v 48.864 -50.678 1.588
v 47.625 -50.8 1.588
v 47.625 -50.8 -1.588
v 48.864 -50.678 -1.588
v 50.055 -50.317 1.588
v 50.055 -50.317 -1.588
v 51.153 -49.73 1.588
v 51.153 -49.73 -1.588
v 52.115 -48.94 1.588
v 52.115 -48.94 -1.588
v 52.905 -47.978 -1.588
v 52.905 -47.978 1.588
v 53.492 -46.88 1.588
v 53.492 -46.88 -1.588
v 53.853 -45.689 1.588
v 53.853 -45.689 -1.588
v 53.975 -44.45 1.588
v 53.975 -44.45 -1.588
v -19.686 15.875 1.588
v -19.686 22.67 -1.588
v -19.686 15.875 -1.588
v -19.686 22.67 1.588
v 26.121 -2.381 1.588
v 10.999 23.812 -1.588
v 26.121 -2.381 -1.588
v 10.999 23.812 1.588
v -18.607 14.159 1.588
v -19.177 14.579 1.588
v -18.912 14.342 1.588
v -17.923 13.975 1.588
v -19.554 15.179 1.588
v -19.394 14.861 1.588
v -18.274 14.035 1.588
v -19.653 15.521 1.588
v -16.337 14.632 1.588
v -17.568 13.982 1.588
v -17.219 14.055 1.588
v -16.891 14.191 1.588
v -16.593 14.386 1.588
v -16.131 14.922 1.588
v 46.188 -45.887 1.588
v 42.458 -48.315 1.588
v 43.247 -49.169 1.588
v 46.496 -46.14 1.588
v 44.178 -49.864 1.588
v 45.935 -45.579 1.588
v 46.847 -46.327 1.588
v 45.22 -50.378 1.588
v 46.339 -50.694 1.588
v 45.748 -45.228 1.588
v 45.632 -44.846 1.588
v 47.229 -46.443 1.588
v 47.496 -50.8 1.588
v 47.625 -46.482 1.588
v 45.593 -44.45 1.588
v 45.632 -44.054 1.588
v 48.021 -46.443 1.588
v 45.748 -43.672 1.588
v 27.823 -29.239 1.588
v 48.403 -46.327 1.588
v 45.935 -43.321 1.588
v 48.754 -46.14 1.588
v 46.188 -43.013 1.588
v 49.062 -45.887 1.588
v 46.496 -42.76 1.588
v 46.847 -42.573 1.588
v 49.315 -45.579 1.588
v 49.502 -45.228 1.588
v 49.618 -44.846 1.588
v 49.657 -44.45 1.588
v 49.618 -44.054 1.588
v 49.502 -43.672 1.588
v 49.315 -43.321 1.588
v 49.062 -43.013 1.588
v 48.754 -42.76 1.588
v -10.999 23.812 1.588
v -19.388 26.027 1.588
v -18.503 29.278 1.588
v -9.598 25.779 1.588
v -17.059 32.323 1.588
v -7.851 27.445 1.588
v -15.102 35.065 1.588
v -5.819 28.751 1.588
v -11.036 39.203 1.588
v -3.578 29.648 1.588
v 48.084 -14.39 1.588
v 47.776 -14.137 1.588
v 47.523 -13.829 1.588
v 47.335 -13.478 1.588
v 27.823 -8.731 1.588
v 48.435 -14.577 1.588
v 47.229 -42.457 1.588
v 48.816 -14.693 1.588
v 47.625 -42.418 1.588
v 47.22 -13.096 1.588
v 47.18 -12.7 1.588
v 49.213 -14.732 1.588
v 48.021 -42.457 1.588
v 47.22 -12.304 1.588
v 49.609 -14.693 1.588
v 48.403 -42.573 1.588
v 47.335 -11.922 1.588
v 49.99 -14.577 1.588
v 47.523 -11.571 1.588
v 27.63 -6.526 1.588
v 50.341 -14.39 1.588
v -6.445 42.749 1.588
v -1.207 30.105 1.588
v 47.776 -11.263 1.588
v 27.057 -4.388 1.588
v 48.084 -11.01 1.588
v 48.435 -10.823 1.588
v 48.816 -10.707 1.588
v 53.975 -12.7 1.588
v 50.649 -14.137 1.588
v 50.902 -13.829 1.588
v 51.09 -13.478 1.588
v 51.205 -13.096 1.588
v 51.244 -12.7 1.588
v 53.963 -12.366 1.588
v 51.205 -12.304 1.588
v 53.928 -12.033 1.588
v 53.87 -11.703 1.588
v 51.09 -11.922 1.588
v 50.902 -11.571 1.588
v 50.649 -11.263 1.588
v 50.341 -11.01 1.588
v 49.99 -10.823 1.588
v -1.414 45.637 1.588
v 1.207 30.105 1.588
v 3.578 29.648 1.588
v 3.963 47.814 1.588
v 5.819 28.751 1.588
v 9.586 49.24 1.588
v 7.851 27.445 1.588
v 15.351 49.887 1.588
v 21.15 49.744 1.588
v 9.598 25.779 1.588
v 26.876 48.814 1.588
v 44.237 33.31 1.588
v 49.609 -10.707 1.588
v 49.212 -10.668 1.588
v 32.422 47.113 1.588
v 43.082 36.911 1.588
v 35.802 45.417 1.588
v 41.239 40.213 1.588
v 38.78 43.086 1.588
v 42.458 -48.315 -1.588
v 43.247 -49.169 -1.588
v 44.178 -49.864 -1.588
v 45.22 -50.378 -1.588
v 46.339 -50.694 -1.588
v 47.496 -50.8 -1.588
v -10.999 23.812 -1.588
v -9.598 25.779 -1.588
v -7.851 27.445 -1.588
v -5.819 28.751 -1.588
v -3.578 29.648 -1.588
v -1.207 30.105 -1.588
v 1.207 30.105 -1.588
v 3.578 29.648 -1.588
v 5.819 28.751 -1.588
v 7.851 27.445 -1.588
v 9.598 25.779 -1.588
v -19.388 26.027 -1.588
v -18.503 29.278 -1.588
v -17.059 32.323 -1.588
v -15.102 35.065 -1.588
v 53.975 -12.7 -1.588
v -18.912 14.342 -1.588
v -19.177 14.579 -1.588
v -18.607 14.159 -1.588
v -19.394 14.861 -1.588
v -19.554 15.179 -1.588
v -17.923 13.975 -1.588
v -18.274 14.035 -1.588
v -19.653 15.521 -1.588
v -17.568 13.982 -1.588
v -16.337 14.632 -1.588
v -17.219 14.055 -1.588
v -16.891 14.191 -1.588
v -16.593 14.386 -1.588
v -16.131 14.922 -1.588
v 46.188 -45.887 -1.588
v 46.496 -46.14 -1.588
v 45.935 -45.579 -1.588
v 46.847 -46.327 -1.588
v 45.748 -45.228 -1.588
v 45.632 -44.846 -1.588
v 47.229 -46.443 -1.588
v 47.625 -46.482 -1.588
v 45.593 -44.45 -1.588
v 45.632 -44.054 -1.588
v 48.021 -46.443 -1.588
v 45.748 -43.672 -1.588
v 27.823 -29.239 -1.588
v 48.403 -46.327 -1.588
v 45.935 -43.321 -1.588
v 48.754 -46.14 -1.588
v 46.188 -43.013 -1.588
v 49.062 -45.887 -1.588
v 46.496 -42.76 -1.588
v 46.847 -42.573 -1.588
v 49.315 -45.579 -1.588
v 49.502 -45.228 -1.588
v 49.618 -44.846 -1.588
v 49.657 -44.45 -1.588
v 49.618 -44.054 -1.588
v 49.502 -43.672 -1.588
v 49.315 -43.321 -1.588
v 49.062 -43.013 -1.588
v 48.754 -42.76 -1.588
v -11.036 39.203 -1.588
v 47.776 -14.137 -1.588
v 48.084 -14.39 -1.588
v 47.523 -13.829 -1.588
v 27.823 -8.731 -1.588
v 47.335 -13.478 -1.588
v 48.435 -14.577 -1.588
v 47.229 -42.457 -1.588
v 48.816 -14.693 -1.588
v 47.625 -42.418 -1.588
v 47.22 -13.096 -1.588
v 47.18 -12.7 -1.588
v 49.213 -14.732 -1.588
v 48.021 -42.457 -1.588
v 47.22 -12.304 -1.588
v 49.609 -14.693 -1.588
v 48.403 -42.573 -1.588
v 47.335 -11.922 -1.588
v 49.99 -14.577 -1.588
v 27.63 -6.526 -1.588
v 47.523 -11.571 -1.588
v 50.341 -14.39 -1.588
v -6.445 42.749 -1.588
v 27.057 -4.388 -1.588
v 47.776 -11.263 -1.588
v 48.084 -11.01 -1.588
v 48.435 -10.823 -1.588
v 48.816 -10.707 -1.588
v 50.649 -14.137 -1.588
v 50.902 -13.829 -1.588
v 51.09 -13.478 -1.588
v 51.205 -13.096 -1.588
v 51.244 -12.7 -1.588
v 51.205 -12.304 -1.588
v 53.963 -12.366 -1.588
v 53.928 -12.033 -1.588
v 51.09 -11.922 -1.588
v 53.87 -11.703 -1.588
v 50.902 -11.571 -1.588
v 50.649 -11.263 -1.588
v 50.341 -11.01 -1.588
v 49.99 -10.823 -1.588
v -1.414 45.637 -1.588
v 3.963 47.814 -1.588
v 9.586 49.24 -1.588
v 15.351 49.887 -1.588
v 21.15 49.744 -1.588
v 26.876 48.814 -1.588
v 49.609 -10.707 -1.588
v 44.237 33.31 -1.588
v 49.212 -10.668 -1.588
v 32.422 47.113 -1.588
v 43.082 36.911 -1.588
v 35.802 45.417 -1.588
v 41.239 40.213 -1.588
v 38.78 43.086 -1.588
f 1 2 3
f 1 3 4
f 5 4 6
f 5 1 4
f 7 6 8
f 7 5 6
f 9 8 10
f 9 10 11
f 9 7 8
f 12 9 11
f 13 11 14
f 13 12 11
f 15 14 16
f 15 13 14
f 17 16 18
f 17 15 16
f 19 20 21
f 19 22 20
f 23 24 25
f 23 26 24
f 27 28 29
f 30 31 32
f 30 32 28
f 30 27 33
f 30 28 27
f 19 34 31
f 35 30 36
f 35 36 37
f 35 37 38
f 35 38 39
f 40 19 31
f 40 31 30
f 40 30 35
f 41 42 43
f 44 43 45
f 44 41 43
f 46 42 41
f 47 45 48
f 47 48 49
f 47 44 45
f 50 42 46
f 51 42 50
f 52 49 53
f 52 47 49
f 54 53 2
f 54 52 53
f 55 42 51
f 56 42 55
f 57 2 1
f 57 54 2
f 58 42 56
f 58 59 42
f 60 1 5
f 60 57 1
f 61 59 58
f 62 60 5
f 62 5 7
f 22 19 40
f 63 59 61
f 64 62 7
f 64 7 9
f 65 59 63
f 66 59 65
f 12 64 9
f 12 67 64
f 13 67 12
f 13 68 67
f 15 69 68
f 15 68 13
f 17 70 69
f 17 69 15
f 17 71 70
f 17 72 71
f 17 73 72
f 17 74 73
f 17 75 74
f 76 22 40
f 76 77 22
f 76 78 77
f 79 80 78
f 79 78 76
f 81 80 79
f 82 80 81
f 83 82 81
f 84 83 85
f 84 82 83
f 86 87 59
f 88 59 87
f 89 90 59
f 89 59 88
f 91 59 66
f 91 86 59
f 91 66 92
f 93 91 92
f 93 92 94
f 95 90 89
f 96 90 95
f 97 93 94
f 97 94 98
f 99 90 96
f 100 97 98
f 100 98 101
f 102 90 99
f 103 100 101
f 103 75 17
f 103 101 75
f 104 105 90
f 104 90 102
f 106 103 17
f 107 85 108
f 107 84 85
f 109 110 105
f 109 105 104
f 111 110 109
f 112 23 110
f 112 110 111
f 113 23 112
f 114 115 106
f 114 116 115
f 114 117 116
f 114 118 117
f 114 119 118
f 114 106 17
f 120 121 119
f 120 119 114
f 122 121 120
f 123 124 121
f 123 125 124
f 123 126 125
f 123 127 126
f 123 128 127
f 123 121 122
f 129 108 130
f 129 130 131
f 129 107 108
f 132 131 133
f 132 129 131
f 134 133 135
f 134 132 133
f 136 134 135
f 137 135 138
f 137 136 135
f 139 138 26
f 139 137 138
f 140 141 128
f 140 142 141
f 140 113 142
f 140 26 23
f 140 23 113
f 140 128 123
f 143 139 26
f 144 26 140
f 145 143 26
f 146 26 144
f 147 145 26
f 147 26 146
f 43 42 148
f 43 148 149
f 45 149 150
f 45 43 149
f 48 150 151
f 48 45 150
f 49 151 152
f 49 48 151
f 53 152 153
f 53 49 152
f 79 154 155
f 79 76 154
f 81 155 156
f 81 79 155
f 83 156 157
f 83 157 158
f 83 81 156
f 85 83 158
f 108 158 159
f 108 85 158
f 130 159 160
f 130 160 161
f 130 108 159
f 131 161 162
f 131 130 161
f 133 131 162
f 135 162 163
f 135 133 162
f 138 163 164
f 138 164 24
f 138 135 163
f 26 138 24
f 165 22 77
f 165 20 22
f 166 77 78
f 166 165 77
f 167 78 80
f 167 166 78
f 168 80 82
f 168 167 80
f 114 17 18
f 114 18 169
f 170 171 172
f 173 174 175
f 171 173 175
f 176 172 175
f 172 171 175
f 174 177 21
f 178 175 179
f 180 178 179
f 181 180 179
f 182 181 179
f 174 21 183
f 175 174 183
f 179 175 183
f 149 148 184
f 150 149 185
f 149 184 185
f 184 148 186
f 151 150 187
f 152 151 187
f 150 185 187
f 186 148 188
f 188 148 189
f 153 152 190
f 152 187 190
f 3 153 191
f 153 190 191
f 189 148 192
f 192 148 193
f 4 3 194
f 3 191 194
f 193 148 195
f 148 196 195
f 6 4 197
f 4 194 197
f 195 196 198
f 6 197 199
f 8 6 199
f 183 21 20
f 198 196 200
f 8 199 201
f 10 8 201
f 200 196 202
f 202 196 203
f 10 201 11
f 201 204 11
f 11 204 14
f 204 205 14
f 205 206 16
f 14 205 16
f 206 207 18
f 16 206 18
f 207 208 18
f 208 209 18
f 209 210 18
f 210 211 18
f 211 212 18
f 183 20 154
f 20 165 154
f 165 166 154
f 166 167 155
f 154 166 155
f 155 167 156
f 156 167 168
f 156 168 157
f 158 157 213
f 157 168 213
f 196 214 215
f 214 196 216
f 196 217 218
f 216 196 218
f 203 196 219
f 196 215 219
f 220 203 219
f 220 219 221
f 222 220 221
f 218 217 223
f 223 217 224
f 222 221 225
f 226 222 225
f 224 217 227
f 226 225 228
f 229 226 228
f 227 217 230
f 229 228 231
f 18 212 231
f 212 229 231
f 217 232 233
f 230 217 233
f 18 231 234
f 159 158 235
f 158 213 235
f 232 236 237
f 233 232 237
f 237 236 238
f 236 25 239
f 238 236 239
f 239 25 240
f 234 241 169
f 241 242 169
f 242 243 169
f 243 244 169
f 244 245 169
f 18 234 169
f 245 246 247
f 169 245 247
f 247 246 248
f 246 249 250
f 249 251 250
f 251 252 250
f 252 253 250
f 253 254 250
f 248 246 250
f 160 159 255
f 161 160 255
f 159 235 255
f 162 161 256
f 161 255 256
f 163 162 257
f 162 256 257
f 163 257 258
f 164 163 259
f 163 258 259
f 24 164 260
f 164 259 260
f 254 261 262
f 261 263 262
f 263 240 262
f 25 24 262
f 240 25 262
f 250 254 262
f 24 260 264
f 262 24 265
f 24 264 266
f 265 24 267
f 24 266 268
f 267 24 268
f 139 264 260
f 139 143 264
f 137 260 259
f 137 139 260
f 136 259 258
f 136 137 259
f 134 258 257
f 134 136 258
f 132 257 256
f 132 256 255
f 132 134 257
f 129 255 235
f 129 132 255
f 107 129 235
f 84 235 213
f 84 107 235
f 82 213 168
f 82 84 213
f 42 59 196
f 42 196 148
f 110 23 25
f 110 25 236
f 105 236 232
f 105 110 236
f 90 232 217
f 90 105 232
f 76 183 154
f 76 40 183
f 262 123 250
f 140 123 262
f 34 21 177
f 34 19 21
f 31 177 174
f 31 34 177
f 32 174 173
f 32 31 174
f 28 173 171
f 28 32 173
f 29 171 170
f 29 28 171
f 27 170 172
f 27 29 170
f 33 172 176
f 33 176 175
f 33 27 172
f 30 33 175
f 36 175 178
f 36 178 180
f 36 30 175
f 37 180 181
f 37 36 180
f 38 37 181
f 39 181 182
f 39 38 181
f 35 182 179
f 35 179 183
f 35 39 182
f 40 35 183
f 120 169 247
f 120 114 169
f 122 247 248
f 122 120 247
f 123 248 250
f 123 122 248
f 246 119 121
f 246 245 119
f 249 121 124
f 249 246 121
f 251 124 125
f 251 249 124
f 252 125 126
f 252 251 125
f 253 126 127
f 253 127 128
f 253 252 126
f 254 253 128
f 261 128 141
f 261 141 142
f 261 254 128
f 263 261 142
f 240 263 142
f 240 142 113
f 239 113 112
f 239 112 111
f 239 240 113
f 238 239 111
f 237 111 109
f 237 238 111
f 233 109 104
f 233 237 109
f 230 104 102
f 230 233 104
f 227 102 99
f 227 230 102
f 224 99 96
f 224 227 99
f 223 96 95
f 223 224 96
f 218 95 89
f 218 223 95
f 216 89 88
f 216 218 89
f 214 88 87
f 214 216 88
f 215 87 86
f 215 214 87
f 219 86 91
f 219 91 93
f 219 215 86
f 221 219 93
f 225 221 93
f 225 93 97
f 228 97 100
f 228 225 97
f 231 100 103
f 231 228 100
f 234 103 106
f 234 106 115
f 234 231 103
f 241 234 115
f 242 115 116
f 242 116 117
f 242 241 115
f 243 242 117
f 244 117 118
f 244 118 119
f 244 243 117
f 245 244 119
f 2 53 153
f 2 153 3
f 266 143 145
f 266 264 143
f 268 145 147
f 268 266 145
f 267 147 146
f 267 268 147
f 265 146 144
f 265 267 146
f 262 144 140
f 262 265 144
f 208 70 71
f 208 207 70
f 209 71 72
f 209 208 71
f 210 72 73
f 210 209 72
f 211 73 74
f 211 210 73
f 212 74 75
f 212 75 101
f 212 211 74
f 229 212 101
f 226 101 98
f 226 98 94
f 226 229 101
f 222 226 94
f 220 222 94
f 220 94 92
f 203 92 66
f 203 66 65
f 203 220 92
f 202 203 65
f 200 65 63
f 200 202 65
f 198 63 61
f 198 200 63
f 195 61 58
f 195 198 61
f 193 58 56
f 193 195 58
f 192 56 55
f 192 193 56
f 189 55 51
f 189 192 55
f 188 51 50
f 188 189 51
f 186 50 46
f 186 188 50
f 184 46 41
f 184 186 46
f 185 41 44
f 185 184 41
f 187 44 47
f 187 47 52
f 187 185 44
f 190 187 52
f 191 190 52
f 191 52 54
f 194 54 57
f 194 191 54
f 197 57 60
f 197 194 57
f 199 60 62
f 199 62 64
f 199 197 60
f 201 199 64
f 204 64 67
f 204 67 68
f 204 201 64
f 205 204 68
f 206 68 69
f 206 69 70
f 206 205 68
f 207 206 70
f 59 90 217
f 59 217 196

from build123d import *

# Parameters (mm, degrees)
SKETCH1_R           = 2.032
BOSS_EXTRUDE1_DEPTH = 1.5875
FILLET1_R           = 19.05


with BuildPart() as part:
    # Sketch1 → Boss-Extrude1 (new, symmetric)
    with BuildSketch(Plane.XY):
        with BuildLine():
            Line((10.998522628, 23.8125), (26.121491242, -2.38125))
            ThreePointArc((26.121491242, -2.38125), (27.390226607, -5.444248127), (27.822968614, -8.73125))
            Line((27.822968614, -8.73125), (27.822968614, -29.239270948))
            Line((27.822968614, -29.239270948), (42.458005799, -48.315226419))
            ThreePointArc((42.458005799, -48.315226419), (44.687348893, -50.145027996), (47.496113055, -50.8))
            Line((47.496113055, -50.8), (47.625, -50.8))
            ThreePointArc((47.625, -50.8), (52.115128061, -48.940128061), (53.975, -44.45))
            Line((53.975, -44.45), (53.975, -12.7))
            ThreePointArc((53.975, -12.7), (53.948566881, -12.198924408), (53.869560945, -11.703411017))
            Line((53.869560945, -11.703411017), (42.458005799, 41.622793369))
            ThreePointArc((42.458005799, 41.622793369), (8.463163904, 49.01990761), (-19.685944915, 28.575))
            Line((-19.685944915, 28.575), (-19.685944915, 15.875))
            ThreePointArc((-19.685944915, 15.875), (-18.273995196, 14.034911301), (-16.131166521, 14.9225))
            Line((-16.131166521, 14.9225), (-10.998522628, 23.8125))
            ThreePointArc((-10.998522628, 23.8125), (0, 30.1625), (10.998522628, 23.8125))
        make_face()
        with Locations((47.625, -44.45)):
            Circle(SKETCH1_R, mode=Mode.SUBTRACT)
        with Locations((49.2125, -12.7)):
            Circle(SKETCH1_R, mode=Mode.SUBTRACT)
    extrude(amount=BOSS_EXTRUDE1_DEPTH, both=True)

    # Fillet1
    fillet1_edges = [part.edges().sort_by_distance(p)[0] for p in [
        (-19.685944915, 28.575, 0),
        (42.458005799, 41.622793369, 0),
    ]]
    fillet(fillet1_edges, radius=FILLET1_R)


solid = part.part
